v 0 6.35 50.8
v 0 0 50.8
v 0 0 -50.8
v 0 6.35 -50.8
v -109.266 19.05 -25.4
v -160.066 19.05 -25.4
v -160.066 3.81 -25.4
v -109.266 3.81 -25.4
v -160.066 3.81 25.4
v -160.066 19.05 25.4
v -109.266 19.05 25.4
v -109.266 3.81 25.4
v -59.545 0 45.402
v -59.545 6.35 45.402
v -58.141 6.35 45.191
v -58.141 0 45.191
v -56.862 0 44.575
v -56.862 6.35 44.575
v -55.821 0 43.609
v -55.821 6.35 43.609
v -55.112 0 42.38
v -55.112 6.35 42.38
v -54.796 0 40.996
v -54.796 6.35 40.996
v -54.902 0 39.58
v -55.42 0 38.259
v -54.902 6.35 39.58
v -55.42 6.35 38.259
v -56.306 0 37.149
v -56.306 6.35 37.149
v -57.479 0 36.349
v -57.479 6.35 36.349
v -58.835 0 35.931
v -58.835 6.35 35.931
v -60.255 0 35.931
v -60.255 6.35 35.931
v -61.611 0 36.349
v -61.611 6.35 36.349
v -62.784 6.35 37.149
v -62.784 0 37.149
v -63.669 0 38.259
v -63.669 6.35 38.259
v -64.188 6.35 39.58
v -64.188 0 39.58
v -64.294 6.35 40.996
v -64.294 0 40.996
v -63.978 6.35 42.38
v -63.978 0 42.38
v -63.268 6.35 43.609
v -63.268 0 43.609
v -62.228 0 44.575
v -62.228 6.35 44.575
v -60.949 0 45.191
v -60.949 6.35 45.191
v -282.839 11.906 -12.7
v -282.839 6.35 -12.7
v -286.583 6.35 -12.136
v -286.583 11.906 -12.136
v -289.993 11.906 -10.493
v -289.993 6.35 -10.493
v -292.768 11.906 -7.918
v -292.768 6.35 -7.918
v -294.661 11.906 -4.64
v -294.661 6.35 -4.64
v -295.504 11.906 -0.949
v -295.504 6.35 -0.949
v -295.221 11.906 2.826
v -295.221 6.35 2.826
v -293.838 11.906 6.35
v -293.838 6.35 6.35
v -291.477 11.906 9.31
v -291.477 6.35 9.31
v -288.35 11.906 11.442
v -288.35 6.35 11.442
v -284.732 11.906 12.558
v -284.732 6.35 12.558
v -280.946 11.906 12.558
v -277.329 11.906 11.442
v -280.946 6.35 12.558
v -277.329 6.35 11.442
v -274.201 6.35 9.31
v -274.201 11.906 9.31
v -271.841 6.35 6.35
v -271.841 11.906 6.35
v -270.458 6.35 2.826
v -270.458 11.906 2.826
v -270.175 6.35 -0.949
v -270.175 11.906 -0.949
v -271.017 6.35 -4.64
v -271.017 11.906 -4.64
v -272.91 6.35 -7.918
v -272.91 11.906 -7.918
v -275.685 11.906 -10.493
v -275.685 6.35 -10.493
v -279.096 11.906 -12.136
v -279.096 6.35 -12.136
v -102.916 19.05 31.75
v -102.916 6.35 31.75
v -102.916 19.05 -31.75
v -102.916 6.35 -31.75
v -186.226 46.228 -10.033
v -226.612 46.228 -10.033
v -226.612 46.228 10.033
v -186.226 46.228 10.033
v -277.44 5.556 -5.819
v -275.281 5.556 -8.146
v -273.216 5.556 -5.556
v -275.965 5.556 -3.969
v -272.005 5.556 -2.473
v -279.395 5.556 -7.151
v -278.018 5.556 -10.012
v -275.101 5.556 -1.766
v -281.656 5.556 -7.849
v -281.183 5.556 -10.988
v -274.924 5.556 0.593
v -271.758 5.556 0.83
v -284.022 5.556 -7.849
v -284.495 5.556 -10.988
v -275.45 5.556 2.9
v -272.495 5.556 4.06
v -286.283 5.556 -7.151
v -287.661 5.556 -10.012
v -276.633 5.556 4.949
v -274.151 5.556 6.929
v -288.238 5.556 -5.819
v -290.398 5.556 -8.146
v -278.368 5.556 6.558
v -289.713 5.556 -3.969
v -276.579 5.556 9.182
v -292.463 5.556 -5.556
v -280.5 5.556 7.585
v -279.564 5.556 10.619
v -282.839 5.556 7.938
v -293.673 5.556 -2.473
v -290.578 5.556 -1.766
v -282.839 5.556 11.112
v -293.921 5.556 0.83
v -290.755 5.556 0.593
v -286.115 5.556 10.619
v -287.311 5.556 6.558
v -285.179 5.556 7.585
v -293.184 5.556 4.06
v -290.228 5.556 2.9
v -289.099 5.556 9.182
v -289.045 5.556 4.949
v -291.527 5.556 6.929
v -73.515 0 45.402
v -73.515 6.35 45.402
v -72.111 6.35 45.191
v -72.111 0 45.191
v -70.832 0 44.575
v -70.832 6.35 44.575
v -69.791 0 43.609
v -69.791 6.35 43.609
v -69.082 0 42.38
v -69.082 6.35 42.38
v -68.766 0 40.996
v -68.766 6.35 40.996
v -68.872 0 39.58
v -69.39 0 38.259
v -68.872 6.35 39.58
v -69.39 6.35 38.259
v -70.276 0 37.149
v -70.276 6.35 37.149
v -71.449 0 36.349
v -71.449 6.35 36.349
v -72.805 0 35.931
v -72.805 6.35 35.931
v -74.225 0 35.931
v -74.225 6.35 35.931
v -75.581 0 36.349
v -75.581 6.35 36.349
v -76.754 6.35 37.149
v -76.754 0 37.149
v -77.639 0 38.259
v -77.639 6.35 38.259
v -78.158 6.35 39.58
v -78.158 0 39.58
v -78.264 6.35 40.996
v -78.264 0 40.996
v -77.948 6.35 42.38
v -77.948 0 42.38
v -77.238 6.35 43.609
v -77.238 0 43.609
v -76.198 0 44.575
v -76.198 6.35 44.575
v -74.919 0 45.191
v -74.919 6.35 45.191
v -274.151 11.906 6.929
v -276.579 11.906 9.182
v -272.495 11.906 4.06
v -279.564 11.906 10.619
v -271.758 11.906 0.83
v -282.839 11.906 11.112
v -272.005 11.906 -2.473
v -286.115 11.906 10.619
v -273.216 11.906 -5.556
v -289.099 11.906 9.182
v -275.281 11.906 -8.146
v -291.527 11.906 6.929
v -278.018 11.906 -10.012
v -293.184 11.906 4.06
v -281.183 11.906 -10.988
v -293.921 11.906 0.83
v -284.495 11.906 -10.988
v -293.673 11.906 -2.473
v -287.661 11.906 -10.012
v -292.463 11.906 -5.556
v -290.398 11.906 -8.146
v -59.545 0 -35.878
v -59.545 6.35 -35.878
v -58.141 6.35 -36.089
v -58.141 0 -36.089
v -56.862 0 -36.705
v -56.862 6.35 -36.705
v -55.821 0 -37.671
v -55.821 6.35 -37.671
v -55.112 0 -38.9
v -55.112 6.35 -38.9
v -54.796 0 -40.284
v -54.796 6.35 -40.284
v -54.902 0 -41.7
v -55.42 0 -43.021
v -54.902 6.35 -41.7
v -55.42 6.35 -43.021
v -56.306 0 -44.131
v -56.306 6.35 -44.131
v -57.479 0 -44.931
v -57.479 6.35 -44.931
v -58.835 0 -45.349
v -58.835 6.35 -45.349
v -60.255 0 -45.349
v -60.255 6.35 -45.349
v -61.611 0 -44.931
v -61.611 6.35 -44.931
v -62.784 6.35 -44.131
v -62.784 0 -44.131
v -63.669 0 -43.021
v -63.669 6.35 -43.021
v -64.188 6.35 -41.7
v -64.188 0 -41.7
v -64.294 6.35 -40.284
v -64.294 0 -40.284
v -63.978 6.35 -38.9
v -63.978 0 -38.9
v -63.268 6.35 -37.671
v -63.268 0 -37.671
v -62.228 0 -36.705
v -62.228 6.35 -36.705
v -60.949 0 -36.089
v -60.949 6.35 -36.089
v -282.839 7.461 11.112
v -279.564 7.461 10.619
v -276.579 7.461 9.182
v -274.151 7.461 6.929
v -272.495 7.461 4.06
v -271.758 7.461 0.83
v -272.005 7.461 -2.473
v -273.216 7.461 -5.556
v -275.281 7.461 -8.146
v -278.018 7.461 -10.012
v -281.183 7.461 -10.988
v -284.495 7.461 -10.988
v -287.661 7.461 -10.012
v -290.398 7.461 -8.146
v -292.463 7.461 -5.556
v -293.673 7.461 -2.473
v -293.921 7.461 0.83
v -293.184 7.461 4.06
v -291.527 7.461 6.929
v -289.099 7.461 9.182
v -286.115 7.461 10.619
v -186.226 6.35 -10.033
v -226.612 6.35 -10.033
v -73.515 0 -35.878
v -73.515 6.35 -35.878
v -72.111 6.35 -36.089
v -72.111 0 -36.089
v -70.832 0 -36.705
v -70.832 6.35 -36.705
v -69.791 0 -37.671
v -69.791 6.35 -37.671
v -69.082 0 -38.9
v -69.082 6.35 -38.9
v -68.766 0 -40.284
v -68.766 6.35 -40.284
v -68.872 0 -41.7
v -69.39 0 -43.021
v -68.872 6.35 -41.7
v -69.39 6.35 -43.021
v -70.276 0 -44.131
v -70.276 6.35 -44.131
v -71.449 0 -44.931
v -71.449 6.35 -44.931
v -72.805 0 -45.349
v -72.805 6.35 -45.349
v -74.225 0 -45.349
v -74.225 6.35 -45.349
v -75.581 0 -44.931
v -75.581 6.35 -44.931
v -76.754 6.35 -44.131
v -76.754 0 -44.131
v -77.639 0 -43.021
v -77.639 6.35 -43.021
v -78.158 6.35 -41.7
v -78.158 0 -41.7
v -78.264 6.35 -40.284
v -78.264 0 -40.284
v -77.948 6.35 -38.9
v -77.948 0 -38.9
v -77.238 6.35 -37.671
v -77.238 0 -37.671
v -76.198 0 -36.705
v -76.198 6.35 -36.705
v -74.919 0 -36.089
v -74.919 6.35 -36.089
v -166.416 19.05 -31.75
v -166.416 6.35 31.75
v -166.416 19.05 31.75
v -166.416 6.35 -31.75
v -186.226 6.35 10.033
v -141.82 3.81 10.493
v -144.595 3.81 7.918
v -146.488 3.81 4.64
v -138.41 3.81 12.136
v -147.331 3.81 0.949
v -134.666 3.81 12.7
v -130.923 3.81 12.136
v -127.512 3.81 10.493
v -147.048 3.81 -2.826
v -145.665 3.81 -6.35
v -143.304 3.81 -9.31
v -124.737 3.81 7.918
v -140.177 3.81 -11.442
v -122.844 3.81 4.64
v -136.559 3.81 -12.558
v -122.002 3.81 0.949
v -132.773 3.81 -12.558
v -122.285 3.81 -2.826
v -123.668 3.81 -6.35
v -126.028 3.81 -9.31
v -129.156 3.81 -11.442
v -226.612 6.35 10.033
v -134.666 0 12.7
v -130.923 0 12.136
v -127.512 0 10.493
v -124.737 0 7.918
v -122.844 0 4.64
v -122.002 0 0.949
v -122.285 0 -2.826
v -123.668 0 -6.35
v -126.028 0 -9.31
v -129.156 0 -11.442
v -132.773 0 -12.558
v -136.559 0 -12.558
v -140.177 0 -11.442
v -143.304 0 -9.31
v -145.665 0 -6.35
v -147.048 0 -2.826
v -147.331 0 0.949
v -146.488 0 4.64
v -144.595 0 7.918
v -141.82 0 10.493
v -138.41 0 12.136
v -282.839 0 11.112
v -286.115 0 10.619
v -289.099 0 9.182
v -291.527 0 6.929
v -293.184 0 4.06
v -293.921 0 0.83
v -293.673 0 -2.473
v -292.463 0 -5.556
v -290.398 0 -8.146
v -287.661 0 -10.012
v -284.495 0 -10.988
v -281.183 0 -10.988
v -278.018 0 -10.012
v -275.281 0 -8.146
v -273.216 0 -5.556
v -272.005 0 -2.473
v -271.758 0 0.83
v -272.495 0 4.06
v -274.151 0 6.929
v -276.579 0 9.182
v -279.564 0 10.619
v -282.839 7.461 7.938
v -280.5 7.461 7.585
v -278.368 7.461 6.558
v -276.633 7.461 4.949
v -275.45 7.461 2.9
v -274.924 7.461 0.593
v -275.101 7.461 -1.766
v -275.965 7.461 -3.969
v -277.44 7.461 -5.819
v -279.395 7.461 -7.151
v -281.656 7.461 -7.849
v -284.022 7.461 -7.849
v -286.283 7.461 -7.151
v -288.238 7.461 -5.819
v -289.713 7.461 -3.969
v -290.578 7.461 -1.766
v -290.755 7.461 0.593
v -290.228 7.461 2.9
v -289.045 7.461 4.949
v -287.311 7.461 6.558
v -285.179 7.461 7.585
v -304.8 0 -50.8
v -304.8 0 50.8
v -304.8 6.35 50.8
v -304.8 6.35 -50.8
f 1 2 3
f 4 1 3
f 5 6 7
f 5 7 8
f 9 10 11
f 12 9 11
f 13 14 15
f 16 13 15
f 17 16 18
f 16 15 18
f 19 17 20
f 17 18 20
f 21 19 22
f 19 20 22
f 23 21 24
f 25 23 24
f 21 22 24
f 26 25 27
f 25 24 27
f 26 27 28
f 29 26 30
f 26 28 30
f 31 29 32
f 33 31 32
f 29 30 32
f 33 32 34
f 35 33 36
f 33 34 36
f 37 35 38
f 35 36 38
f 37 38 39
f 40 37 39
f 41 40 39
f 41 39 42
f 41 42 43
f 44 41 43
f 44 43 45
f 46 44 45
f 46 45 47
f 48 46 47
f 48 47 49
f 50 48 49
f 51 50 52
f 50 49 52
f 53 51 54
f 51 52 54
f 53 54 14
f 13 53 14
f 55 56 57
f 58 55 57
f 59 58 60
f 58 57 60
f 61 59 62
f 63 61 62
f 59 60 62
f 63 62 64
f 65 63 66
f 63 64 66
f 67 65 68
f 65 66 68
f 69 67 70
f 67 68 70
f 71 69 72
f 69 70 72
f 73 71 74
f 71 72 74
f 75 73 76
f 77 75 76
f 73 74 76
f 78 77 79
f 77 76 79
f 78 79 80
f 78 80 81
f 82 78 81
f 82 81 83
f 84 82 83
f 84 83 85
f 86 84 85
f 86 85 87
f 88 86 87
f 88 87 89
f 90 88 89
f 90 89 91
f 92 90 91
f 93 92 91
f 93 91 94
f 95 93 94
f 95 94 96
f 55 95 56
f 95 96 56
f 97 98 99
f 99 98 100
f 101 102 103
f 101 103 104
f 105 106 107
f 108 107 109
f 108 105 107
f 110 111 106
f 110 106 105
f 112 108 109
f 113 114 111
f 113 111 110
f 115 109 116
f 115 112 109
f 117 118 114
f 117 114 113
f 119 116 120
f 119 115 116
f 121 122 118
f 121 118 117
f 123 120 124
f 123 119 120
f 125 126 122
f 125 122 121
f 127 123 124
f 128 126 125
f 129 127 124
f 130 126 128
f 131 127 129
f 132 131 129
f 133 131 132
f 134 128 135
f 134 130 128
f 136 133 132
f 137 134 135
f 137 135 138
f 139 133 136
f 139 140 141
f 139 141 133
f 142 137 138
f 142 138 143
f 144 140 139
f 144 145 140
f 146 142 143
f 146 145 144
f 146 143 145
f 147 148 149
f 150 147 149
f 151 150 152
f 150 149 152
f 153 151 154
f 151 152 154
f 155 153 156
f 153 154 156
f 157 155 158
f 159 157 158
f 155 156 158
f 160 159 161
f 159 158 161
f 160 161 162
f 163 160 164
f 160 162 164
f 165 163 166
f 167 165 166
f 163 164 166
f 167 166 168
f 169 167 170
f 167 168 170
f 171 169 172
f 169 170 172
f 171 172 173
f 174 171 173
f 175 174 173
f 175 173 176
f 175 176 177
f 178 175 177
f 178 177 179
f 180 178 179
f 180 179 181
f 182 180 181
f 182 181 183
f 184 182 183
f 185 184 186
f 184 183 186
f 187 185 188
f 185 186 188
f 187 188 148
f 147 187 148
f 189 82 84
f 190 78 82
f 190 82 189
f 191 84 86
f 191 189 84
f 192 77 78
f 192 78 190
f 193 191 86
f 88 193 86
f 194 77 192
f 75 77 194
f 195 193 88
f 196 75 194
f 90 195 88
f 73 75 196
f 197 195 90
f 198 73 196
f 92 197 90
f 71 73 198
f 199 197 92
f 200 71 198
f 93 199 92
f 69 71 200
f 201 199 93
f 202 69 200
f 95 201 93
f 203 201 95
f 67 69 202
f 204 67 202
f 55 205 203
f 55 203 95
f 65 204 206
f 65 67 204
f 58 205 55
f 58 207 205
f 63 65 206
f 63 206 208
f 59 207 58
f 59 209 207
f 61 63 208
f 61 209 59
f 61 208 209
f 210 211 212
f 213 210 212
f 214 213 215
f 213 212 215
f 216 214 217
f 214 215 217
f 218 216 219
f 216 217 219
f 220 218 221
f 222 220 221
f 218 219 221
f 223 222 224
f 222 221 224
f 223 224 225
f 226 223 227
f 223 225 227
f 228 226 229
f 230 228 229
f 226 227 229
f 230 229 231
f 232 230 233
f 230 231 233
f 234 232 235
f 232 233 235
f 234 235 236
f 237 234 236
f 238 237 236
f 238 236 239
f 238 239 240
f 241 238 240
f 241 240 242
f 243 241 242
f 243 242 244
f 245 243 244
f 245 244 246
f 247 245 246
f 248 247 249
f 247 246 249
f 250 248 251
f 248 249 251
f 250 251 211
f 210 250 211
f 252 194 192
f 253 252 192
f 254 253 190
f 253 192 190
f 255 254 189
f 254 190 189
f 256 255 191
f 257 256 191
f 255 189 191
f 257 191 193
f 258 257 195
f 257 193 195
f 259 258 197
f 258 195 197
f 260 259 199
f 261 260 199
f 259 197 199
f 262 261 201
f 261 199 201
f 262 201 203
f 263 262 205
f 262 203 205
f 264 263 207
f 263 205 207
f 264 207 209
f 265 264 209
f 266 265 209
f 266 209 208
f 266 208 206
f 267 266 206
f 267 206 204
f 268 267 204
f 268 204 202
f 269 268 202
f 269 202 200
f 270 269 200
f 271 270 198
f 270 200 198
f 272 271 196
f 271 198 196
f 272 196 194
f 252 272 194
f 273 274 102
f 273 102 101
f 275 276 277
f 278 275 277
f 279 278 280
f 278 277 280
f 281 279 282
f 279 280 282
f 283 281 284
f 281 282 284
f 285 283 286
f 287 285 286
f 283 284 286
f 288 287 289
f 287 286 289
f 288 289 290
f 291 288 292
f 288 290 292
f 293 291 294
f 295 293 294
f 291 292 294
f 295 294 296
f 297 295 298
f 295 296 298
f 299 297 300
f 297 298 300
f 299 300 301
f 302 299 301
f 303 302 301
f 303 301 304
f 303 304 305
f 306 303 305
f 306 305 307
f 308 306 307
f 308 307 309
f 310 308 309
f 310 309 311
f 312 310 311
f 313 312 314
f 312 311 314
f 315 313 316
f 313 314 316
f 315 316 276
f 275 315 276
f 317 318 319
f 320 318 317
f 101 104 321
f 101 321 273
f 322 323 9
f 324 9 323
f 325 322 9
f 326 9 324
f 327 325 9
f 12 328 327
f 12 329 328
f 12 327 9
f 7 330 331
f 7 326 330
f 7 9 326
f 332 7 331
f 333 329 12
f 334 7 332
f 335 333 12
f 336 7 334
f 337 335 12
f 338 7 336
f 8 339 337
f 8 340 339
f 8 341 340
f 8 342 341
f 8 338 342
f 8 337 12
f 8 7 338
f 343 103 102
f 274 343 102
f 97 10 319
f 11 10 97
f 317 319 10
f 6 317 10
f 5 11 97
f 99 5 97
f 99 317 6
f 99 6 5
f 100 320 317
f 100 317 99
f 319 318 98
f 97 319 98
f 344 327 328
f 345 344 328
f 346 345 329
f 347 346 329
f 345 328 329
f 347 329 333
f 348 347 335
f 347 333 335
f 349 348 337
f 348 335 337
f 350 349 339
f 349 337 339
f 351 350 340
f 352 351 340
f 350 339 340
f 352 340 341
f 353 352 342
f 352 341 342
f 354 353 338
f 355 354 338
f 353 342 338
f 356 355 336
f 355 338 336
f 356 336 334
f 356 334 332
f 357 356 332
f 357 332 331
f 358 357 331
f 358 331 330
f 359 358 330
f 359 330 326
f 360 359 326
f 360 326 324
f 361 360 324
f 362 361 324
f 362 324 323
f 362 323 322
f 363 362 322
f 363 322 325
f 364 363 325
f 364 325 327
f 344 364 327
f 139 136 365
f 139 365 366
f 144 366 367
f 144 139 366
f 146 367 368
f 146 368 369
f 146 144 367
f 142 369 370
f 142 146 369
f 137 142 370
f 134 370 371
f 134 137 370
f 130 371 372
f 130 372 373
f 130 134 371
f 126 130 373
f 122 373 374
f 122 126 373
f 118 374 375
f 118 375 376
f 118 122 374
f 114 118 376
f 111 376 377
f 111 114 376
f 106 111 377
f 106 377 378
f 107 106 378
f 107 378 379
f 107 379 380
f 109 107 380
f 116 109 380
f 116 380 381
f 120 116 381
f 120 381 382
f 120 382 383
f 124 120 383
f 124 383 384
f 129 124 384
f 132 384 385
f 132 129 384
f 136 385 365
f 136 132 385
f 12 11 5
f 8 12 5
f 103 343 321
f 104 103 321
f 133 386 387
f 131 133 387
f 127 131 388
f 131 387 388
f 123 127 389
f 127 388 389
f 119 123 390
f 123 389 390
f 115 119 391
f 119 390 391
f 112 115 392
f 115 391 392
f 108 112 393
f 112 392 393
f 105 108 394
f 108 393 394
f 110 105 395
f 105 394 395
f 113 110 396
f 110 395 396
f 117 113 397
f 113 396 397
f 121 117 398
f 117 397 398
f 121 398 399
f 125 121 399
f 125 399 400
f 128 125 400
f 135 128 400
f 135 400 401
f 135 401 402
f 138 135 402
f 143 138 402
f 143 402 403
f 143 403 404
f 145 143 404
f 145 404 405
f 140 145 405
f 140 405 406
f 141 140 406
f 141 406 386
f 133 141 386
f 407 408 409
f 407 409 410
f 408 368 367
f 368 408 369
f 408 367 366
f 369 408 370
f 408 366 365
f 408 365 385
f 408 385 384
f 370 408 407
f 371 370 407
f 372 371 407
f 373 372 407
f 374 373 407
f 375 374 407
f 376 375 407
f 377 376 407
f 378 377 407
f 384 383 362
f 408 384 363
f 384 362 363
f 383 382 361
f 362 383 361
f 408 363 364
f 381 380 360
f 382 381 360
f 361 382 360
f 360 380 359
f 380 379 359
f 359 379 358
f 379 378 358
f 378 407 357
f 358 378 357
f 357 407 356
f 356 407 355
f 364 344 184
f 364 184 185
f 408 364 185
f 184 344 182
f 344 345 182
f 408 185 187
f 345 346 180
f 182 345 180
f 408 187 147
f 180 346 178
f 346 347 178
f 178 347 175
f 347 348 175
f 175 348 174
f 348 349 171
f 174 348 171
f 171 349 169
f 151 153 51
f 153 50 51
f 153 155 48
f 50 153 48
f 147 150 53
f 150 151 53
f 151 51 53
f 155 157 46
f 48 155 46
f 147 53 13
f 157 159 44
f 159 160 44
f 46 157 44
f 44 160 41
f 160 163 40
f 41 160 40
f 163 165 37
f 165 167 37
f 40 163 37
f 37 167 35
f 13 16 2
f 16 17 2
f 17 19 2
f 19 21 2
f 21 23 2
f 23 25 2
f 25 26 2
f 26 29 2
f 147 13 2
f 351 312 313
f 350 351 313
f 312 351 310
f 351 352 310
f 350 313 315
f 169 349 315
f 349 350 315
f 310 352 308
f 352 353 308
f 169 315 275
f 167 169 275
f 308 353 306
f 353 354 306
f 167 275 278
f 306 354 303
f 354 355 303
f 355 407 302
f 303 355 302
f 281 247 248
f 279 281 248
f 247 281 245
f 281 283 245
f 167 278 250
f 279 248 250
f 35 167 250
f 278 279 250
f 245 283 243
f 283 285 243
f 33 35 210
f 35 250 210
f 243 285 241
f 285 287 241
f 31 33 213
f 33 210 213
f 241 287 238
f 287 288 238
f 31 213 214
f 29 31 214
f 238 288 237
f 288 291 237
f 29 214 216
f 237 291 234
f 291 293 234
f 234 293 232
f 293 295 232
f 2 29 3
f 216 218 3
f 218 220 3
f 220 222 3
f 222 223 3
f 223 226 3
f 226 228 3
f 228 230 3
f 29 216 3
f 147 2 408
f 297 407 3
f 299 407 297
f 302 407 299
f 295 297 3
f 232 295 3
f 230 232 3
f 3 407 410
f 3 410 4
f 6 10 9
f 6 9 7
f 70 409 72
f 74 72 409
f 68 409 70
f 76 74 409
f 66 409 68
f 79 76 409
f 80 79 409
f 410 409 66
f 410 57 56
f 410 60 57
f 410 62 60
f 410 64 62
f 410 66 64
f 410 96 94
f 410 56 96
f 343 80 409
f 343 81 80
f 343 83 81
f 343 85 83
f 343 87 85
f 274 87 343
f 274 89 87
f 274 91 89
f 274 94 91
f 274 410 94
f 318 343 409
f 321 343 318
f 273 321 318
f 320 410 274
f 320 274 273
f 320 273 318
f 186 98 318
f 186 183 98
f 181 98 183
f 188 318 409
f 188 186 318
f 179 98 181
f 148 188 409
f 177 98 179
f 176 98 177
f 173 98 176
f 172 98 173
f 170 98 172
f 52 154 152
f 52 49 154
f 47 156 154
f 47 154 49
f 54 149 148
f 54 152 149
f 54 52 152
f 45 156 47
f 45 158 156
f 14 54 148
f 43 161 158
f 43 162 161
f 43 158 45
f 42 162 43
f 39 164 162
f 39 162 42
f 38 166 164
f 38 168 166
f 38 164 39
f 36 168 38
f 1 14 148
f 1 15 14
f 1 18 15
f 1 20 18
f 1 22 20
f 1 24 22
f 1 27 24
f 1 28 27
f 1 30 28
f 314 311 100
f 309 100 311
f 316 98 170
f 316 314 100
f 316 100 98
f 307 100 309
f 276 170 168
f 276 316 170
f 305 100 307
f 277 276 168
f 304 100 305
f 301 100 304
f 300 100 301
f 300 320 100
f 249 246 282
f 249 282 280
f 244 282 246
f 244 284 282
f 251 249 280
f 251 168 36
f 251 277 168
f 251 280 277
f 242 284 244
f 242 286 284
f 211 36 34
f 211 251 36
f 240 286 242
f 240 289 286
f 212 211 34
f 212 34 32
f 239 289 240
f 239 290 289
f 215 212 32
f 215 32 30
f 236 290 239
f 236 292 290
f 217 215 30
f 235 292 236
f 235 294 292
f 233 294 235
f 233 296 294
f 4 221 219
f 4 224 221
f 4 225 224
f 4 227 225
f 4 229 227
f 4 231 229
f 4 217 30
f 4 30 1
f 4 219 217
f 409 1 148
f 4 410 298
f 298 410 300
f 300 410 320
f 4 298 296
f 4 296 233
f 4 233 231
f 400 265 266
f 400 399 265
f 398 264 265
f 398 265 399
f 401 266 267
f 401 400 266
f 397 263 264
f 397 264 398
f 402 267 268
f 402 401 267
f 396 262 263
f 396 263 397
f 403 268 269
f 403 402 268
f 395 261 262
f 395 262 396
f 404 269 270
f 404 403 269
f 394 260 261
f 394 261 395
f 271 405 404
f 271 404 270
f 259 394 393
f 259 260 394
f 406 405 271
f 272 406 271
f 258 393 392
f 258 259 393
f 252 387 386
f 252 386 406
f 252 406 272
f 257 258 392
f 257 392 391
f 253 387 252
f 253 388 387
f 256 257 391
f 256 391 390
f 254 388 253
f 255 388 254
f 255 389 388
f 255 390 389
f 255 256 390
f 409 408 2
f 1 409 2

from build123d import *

# Parameters (mm, degrees)
SKETCH1_W           = 304.8
SKETCH1_H           = 101.6
BOSS_EXTRUDE1_DEPTH = 6.35
SKETCH2_R           = 12.7
BOSS_EXTRUDE3_DEPTH = 5.55625
SKETCH9_R           = 11.1125
CUT_EXTRUDE4_DEPTH  = 4.445
CUT_EXTRUDE5_START  = -5.55625
SKETCH10_R          = 11.1125
CUT_EXTRUDE5_DEPTH  = 5.55625
SKETCH11_R          = 7.9375
CUT_EXTRUDE6_DEPTH  = 310.094403462
SKETCH12_R          = 12.7
CUT_EXTRUDE7_DEPTH  = 310.0695755
SKETCH22_W          = 63.5
SKETCH22_H          = 63.5
BOSS_EXTRUDE7_DEPTH = 12.7
SKETCH25_W          = 50.8
SKETCH25_H          = 50.8
CUT_EXTRUDE11_DEPTH = 15.24
SKETCH18_W          = 40.386
SKETCH18_H          = 20.066
BOSS_EXTRUDE5_DEPTH = 39.878
SKETCH32_R          = 4.7625
CUT_EXTRUDE12_DEPTH = 6.35


with BuildPart() as part:
    # Sketch1 → Boss-Extrude1 (new body)
    with BuildSketch(Plane(origin=(0, 0, 0), x_dir=(1, 0, 0), z_dir=(0, 1, 0))):
        with Locations((-152.4, 0)):
            Rectangle(SKETCH1_W, SKETCH1_H)
    extrude(amount=BOSS_EXTRUDE1_DEPTH)

    # Sketch2 → Boss-Extrude3 (add)
    with BuildSketch(Plane(origin=(0, 6.35, 0), x_dir=(1, 0, 0), z_dir=(0, 1, 0))):
        with Locations(Location((-282.839226834, 0, 0), (0, 0, 90))):
            Circle(SKETCH2_R)
    extrude(amount=BOSS_EXTRUDE3_DEPTH)

    # Sketch9 → Cut-Extrude4 (cut)
    with BuildSketch(Plane(origin=(0, 11.90625, 0), x_dir=(1, 0, 0), z_dir=(0, 1, 0))):
        with Locations(Location((-282.839226834, 0, 0), (0, 0, 270))):
            Circle(SKETCH9_R)
    extrude(amount=-CUT_EXTRUDE4_DEPTH, mode=Mode.SUBTRACT)

    # Sketch10 → Cut-Extrude5 (cut)
    with BuildSketch(Plane(origin=(0, 0, 0), x_dir=(-1, 0, 0), z_dir=(0, -1, 0)).offset(CUT_EXTRUDE5_START)):
        with Locations(Location((282.839226834, 0, 0), (0, 0, 270))):
            Circle(SKETCH10_R)
    extrude(amount=CUT_EXTRUDE5_DEPTH, mode=Mode.SUBTRACT)

    # Sketch11 → Cut-Extrude6 (cut, through all)
    with BuildSketch(Plane(origin=(0, 7.46125, 0), x_dir=(1, 0, 0), z_dir=(0, 1, 0))):
        with Locations(Location((-282.839226834, 0, 0), (0, 0, 270))):
            Circle(SKETCH11_R)
    extrude(amount=-CUT_EXTRUDE6_DEPTH, mode=Mode.SUBTRACT)

    # Sketch12 → Cut-Extrude7 (cut, through all)
    with BuildSketch(Plane(origin=(0, 6.35, 0), x_dir=(1, 0, 0), z_dir=(0, 1, 0))):
        with Locations(Location((-134.666203771, 0, 0), (0, 0, 270))):
            Circle(SKETCH12_R)
    extrude(amount=-CUT_EXTRUDE7_DEPTH, mode=Mode.SUBTRACT)

    # Sketch22 → Boss-Extrude7 (add)
    with BuildSketch(Plane(origin=(0, 6.35, 0), x_dir=(1, 0, 0), z_dir=(0, 1, 0))):
        with Locations((-134.666203771, 0)):
            Rectangle(SKETCH22_W, SKETCH22_H)
    extrude(amount=BOSS_EXTRUDE7_DEPTH)

    # Sketch25 → Cut-Extrude11 (cut)
    with BuildSketch(Plane(origin=(0, 19.05, 0), x_dir=(1, 0, 0), z_dir=(0, 1, 0))):
        with Locations((-134.666203771, 0)):
            Rectangle(SKETCH25_W, SKETCH25_H)
    extrude(amount=-CUT_EXTRUDE11_DEPTH, mode=Mode.SUBTRACT)

    # Sketch18 → Boss-Extrude5 (add)
    with BuildSketch(Plane(origin=(0, 6.35, 0), x_dir=(1, 0, 0), z_dir=(0, 1, 0))):
        with Locations((-206.419013169, 0)):
            Rectangle(SKETCH18_W, SKETCH18_H)
    extrude(amount=BOSS_EXTRUDE5_DEPTH)

    # Sketch32 → Cut-Extrude12 (cut)
    with BuildSketch(Plane(origin=(0, 6.35, 0), x_dir=(1, 0, 0), z_dir=(0, 1, 0))):
        with Locations(Location((-59.544913048, -40.64, 0), (0, 0, 270))):
            Circle(SKETCH32_R)
        with Locations(Location((-73.514913048, -40.64, 0), (0, 0, 270))):
            Circle(SKETCH32_R)
        with Locations(Location((-59.544913048, 40.64, 0), (0, 0, 270))):
            Circle(SKETCH32_R)
        with Locations(Location((-73.514913048, 40.64, 0), (0, 0, 270))):
            Circle(SKETCH32_R)
    extrude(amount=-CUT_EXTRUDE12_DEPTH, mode=Mode.SUBTRACT)


solid = part.part
